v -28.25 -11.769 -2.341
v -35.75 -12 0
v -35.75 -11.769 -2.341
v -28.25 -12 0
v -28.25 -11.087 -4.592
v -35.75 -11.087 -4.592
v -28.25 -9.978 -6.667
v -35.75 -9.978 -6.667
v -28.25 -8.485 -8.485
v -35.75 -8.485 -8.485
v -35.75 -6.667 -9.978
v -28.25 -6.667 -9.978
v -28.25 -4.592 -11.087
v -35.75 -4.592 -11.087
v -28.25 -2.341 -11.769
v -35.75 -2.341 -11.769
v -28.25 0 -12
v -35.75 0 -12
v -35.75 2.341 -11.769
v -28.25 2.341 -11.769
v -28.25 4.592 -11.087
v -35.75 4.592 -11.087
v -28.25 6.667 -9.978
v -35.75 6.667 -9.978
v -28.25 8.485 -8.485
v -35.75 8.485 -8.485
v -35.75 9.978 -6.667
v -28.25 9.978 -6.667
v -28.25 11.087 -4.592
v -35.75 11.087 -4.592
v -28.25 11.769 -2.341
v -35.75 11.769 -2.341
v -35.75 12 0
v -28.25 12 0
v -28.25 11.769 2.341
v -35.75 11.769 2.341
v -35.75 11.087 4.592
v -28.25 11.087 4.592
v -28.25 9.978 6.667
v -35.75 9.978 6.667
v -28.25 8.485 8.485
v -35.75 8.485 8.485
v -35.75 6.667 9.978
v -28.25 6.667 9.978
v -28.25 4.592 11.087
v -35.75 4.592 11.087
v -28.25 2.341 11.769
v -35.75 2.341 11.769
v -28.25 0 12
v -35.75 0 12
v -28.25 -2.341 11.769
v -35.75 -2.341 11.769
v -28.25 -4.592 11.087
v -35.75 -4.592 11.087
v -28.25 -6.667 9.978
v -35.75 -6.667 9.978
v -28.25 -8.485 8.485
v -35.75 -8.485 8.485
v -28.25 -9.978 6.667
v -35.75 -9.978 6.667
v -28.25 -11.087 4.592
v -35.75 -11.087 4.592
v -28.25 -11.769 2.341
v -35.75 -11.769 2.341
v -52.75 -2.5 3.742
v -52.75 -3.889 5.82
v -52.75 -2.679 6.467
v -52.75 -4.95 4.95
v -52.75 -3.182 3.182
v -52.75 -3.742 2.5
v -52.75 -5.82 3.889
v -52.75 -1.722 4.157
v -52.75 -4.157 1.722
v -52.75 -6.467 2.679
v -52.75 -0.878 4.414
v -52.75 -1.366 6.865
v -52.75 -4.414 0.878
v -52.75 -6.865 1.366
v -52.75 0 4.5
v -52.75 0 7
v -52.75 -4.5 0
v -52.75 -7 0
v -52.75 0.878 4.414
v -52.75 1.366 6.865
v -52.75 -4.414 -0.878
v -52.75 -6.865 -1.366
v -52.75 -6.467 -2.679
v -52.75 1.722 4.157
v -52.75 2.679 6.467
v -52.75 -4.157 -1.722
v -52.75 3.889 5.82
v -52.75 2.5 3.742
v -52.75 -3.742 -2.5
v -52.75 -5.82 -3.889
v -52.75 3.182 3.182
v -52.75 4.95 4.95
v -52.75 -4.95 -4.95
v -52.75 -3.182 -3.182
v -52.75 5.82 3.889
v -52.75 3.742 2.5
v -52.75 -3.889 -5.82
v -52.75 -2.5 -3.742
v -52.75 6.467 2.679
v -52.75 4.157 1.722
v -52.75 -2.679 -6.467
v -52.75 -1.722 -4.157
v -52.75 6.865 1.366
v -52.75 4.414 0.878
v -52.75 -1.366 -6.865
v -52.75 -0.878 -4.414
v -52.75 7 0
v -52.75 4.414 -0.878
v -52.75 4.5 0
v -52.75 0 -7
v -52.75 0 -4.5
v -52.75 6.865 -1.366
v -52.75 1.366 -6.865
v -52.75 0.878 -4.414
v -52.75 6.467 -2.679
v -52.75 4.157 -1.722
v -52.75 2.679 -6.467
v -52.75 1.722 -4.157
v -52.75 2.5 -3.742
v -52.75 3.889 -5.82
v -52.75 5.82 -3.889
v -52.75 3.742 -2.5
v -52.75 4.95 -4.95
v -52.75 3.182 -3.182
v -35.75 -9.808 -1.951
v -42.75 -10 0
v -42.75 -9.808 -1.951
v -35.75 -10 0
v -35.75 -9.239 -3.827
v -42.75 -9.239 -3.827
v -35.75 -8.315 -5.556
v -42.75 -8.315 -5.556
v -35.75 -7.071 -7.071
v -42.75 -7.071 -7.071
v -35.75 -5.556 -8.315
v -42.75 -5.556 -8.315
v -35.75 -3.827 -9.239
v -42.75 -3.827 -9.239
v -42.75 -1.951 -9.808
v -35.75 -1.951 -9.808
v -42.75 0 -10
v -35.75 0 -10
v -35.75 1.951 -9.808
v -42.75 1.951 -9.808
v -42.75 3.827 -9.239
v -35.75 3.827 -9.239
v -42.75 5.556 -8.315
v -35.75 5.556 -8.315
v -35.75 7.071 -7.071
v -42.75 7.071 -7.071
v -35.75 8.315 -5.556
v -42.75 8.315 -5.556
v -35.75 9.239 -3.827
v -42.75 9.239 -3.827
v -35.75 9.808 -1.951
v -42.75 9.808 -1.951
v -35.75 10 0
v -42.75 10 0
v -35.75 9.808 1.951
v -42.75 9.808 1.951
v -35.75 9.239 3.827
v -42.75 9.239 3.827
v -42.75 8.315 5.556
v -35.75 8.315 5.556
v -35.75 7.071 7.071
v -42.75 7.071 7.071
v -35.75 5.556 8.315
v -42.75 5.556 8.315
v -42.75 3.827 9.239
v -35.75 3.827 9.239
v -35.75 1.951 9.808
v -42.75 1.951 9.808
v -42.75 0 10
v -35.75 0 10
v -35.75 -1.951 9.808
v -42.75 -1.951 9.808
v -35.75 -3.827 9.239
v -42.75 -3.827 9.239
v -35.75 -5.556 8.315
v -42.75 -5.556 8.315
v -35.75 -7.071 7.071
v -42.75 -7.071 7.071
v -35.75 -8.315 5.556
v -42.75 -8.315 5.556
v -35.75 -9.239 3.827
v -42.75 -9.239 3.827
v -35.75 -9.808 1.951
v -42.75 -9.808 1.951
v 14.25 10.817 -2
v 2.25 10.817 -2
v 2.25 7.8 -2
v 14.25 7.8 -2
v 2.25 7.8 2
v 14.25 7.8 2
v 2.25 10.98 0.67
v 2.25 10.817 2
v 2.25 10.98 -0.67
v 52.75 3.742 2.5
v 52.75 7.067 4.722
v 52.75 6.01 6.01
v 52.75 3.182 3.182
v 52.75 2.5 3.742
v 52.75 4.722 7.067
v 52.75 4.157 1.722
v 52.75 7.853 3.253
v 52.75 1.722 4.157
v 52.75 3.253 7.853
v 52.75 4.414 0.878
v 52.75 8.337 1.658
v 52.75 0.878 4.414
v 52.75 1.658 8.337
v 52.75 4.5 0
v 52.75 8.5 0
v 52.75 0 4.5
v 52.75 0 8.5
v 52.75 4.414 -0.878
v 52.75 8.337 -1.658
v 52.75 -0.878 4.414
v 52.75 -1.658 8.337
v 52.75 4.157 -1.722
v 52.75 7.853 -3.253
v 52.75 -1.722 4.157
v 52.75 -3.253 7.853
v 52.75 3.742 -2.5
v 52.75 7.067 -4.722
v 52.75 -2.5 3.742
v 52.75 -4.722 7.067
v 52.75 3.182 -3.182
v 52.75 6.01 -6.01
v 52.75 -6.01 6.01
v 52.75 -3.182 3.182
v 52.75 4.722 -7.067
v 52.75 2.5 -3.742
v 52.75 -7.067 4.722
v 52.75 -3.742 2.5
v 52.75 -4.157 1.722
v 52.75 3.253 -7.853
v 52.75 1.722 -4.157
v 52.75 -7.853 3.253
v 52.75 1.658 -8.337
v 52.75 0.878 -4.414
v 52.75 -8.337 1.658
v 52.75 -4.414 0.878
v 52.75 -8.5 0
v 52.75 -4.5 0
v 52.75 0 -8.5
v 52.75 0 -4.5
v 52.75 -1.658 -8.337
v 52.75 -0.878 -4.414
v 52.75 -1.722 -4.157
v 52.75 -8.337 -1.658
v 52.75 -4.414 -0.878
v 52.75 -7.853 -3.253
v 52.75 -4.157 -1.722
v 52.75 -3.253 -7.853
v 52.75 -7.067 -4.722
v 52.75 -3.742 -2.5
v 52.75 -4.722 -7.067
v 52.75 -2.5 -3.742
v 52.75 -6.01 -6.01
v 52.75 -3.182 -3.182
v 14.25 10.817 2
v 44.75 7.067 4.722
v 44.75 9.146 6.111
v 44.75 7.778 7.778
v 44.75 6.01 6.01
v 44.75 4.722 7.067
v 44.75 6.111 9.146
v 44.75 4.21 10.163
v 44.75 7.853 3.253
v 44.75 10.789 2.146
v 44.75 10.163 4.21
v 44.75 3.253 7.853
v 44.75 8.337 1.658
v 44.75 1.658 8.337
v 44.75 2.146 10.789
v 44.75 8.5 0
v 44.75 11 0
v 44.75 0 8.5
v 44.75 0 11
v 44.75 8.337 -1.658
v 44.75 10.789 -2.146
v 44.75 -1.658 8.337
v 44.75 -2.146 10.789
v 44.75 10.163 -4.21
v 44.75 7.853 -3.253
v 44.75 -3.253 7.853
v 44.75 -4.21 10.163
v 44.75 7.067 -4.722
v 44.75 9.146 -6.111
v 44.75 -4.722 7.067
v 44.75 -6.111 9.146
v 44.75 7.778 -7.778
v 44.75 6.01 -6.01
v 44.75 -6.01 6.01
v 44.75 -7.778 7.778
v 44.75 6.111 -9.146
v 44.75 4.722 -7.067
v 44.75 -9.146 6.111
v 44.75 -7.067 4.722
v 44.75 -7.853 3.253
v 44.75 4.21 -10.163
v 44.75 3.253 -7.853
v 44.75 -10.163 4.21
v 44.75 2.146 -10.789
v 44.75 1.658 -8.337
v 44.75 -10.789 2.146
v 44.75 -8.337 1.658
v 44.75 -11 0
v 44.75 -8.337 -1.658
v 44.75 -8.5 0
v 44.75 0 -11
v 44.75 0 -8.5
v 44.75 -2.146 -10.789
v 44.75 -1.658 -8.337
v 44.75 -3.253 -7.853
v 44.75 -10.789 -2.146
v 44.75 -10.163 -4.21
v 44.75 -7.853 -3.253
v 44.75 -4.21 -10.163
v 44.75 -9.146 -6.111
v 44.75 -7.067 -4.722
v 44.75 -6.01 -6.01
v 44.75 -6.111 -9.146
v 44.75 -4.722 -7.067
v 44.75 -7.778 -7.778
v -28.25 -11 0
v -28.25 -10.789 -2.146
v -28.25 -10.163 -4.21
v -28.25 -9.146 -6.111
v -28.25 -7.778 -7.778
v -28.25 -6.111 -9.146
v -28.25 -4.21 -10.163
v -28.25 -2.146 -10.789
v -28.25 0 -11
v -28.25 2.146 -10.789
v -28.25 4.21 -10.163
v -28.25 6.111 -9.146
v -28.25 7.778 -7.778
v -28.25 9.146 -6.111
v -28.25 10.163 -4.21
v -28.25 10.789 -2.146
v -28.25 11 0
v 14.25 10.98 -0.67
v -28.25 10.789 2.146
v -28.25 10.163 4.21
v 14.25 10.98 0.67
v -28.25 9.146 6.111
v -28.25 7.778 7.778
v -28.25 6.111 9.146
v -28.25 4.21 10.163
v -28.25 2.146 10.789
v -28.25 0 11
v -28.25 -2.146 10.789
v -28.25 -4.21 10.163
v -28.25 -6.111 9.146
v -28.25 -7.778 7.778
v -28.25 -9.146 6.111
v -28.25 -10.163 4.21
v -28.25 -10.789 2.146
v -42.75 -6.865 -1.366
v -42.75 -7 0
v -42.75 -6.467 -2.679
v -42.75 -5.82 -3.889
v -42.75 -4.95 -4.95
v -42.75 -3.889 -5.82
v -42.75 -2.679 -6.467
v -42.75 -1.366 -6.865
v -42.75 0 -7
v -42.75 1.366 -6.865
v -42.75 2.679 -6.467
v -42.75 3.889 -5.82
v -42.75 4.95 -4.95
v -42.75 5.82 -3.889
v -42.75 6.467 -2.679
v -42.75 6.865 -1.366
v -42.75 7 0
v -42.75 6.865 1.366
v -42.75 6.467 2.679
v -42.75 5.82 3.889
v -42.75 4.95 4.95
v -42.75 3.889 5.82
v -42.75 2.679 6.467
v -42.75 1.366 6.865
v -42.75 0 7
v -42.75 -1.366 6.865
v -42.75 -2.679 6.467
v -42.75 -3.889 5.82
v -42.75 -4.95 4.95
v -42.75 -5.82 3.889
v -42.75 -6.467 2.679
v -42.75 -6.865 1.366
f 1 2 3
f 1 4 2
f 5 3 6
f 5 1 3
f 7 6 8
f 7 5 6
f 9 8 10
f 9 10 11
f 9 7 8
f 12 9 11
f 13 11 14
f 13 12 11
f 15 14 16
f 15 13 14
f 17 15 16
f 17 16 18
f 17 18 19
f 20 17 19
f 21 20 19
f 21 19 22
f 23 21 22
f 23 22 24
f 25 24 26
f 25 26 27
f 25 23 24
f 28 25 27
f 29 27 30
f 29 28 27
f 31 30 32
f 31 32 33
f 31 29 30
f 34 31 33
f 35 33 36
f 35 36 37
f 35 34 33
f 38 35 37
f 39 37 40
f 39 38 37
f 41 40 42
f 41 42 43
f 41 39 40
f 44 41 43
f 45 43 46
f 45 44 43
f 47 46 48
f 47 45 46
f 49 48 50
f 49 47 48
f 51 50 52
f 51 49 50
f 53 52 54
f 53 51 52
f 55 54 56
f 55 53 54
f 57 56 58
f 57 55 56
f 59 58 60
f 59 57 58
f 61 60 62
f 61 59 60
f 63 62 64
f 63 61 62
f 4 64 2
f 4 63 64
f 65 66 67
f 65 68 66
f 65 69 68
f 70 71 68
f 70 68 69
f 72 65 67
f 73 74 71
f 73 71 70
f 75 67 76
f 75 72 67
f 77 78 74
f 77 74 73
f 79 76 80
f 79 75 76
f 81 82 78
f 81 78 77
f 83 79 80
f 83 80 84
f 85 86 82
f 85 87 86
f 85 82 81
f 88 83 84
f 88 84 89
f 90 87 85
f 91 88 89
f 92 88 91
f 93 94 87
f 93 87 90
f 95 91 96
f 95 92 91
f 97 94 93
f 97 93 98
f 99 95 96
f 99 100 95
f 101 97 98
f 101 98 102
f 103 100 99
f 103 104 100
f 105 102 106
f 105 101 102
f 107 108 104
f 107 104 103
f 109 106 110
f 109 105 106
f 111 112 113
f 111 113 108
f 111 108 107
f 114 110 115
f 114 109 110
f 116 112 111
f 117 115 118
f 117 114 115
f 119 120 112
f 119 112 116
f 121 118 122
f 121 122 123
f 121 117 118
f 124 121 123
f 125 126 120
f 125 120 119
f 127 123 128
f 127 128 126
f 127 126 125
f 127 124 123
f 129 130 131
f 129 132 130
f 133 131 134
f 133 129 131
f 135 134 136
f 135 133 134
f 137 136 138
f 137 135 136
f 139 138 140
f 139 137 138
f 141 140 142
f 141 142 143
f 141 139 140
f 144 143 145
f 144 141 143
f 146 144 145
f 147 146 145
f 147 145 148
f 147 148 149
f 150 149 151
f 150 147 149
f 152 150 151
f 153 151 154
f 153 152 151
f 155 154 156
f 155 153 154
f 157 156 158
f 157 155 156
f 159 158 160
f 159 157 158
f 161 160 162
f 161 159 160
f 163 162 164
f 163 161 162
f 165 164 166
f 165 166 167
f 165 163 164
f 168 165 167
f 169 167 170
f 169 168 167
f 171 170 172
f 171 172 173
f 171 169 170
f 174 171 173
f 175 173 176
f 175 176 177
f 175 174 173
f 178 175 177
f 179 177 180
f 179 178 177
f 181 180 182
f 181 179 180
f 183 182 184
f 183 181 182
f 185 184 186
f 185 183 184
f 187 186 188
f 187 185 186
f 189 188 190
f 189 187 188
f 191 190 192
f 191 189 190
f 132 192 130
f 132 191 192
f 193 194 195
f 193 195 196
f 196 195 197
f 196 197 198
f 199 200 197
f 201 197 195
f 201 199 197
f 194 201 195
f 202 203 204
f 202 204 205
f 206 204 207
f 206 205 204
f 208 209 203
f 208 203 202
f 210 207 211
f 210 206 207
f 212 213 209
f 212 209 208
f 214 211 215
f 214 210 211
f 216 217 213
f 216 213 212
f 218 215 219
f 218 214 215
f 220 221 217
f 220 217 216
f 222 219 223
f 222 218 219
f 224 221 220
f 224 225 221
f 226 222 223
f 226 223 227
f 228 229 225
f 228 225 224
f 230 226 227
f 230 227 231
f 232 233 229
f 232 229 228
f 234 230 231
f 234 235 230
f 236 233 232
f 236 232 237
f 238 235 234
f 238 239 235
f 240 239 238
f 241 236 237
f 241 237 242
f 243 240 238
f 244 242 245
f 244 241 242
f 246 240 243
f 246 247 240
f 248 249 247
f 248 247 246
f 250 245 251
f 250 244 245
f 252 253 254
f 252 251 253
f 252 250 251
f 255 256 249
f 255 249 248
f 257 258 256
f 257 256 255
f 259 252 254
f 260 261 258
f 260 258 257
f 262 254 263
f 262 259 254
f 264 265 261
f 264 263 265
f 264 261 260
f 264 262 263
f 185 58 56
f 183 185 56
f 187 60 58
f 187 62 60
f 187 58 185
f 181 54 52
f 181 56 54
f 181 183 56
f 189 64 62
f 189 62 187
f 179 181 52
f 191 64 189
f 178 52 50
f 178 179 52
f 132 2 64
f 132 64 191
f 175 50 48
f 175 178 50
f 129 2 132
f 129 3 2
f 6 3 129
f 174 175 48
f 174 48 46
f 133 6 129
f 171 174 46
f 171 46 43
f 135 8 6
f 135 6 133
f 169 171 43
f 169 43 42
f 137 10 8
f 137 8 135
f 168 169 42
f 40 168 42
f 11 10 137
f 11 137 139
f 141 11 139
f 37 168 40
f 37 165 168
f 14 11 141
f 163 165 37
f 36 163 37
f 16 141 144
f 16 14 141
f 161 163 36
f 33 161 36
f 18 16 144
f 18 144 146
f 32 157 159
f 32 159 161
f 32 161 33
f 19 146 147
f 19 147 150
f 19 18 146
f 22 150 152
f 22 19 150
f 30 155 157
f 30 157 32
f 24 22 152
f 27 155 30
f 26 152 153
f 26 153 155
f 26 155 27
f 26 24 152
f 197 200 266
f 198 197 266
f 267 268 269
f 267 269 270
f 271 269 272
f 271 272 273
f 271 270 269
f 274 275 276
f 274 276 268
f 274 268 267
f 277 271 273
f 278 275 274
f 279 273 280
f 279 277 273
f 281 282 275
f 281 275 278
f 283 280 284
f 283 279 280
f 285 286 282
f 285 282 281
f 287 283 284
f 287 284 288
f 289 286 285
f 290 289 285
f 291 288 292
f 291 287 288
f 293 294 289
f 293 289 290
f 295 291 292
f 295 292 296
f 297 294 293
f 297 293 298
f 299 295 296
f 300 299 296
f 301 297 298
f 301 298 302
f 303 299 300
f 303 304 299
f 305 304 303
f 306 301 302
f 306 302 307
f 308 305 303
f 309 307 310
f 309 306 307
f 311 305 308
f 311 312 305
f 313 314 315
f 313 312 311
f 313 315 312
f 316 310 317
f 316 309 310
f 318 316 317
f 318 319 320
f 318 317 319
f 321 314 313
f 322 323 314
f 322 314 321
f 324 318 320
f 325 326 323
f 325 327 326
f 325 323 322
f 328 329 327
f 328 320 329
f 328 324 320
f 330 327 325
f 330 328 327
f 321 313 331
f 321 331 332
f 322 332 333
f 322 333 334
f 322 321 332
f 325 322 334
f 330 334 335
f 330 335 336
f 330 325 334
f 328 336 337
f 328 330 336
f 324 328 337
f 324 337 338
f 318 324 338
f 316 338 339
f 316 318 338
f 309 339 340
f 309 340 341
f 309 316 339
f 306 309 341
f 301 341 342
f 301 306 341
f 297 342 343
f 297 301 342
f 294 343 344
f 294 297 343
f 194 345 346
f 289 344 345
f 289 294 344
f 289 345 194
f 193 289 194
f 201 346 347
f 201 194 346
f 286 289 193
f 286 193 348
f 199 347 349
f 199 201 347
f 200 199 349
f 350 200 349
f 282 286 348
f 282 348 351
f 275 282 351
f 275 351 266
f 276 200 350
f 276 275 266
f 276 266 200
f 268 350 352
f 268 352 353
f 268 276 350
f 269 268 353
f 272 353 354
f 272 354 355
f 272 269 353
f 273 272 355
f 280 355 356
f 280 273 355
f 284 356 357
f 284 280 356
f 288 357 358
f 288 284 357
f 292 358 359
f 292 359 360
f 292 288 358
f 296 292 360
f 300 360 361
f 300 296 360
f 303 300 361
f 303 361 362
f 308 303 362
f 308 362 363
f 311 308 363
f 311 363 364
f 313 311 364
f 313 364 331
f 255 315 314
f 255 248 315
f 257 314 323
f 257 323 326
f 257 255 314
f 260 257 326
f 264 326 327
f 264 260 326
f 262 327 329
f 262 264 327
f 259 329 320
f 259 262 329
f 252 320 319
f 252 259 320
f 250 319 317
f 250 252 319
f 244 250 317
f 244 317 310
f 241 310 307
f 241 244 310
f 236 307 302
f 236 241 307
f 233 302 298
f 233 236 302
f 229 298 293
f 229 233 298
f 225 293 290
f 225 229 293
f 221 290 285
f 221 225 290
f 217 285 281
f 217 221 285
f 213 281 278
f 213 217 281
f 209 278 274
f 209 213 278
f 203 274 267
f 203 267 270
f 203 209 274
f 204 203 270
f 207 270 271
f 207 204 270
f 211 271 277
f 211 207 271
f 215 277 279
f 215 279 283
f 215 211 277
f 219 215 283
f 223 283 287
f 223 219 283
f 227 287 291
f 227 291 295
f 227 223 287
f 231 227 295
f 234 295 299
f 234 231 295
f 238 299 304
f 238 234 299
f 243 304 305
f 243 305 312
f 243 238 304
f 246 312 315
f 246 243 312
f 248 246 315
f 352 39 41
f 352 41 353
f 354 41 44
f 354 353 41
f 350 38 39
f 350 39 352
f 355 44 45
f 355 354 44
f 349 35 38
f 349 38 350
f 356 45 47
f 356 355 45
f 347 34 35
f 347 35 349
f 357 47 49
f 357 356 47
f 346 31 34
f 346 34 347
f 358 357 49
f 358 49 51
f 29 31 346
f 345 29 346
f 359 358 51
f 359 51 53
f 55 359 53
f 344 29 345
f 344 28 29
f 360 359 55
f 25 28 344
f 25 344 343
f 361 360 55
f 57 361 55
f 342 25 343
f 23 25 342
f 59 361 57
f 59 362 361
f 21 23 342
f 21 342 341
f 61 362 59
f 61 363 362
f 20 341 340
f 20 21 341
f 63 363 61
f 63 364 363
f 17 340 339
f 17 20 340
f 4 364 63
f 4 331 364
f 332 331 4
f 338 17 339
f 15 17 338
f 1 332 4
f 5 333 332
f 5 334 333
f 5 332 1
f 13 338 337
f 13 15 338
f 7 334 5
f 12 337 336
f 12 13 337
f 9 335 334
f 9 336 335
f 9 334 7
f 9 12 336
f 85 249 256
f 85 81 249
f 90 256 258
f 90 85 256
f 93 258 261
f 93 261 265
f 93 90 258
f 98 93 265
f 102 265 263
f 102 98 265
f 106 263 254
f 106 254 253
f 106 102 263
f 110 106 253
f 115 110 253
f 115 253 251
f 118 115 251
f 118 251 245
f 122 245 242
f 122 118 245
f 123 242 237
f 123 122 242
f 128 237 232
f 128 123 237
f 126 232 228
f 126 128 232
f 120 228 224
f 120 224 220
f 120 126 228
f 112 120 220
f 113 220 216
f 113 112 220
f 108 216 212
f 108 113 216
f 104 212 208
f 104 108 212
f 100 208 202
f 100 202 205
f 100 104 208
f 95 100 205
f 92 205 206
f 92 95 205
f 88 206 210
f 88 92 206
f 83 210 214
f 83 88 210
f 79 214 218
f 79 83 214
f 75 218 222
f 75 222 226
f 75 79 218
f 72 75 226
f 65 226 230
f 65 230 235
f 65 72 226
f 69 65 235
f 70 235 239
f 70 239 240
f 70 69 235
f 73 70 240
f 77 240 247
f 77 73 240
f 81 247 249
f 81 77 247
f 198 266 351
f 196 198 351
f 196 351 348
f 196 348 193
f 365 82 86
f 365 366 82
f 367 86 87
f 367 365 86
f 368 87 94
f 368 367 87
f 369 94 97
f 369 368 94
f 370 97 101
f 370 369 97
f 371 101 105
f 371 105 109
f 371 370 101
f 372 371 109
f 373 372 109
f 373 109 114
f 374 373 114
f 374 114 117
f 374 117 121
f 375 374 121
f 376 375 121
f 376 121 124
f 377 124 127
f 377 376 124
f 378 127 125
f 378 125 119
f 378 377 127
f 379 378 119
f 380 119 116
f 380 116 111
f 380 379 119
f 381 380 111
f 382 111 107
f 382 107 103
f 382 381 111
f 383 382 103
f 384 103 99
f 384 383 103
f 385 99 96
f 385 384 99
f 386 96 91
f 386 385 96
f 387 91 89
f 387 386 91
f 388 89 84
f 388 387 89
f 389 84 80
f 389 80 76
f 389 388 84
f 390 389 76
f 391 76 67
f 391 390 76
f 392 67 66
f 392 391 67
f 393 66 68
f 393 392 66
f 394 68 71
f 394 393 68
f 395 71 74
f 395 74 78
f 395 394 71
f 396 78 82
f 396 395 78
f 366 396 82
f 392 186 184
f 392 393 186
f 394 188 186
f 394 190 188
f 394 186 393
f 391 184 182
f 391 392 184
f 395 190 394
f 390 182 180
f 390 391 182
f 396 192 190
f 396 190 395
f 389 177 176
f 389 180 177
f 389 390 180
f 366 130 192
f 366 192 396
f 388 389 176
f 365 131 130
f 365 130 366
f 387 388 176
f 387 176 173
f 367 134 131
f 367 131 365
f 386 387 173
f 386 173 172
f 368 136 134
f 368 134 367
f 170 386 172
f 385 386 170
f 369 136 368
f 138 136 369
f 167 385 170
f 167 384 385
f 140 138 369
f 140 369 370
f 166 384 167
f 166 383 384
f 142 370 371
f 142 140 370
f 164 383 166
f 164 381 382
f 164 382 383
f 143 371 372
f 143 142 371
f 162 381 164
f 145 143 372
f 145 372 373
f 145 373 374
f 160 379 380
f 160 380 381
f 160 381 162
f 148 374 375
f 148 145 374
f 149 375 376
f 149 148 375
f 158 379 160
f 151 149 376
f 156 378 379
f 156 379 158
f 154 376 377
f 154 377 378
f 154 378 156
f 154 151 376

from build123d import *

# Parameters (mm, degrees)
SKETCH7_W          = 12
SKETCH7_H          = 4
CUT_EXTRUDE4_DEPTH = 3.2


with BuildPart() as part:
    # Sketch6 → Revolve2 (revolve)
    with BuildSketch(Plane.XY, mode=Mode.PRIVATE) as revolve2_sk:
        Polygon((-52.75, 4.5), (-52.75, 7), (-42.75, 7), (-42.75, 10), (-35.75, 10), (-35.75, 12), (-28.25, 12), (-28.25, 11), (44.75, 11), (44.75, 8.5), (52.75, 8.5), (52.75, 4.5), align=None)
    revolve(revolve2_sk.sketch.rotate(Axis((-52.75, 0, 0), (1, 0, 0)), 180), axis=Axis((-52.75, 0, 0), (1, 0, 0)))

    # Sketch7 → Cut-Extrude4 (cut)
    with BuildSketch(Plane(origin=(0, 11, 0), x_dir=(1, 0, 0), z_dir=(0, 1, 0))):
        with Locations((8.25, 0)):
            Rectangle(SKETCH7_W, SKETCH7_H)
    extrude(amount=-CUT_EXTRUDE4_DEPTH, mode=Mode.SUBTRACT)


solid = part.part
